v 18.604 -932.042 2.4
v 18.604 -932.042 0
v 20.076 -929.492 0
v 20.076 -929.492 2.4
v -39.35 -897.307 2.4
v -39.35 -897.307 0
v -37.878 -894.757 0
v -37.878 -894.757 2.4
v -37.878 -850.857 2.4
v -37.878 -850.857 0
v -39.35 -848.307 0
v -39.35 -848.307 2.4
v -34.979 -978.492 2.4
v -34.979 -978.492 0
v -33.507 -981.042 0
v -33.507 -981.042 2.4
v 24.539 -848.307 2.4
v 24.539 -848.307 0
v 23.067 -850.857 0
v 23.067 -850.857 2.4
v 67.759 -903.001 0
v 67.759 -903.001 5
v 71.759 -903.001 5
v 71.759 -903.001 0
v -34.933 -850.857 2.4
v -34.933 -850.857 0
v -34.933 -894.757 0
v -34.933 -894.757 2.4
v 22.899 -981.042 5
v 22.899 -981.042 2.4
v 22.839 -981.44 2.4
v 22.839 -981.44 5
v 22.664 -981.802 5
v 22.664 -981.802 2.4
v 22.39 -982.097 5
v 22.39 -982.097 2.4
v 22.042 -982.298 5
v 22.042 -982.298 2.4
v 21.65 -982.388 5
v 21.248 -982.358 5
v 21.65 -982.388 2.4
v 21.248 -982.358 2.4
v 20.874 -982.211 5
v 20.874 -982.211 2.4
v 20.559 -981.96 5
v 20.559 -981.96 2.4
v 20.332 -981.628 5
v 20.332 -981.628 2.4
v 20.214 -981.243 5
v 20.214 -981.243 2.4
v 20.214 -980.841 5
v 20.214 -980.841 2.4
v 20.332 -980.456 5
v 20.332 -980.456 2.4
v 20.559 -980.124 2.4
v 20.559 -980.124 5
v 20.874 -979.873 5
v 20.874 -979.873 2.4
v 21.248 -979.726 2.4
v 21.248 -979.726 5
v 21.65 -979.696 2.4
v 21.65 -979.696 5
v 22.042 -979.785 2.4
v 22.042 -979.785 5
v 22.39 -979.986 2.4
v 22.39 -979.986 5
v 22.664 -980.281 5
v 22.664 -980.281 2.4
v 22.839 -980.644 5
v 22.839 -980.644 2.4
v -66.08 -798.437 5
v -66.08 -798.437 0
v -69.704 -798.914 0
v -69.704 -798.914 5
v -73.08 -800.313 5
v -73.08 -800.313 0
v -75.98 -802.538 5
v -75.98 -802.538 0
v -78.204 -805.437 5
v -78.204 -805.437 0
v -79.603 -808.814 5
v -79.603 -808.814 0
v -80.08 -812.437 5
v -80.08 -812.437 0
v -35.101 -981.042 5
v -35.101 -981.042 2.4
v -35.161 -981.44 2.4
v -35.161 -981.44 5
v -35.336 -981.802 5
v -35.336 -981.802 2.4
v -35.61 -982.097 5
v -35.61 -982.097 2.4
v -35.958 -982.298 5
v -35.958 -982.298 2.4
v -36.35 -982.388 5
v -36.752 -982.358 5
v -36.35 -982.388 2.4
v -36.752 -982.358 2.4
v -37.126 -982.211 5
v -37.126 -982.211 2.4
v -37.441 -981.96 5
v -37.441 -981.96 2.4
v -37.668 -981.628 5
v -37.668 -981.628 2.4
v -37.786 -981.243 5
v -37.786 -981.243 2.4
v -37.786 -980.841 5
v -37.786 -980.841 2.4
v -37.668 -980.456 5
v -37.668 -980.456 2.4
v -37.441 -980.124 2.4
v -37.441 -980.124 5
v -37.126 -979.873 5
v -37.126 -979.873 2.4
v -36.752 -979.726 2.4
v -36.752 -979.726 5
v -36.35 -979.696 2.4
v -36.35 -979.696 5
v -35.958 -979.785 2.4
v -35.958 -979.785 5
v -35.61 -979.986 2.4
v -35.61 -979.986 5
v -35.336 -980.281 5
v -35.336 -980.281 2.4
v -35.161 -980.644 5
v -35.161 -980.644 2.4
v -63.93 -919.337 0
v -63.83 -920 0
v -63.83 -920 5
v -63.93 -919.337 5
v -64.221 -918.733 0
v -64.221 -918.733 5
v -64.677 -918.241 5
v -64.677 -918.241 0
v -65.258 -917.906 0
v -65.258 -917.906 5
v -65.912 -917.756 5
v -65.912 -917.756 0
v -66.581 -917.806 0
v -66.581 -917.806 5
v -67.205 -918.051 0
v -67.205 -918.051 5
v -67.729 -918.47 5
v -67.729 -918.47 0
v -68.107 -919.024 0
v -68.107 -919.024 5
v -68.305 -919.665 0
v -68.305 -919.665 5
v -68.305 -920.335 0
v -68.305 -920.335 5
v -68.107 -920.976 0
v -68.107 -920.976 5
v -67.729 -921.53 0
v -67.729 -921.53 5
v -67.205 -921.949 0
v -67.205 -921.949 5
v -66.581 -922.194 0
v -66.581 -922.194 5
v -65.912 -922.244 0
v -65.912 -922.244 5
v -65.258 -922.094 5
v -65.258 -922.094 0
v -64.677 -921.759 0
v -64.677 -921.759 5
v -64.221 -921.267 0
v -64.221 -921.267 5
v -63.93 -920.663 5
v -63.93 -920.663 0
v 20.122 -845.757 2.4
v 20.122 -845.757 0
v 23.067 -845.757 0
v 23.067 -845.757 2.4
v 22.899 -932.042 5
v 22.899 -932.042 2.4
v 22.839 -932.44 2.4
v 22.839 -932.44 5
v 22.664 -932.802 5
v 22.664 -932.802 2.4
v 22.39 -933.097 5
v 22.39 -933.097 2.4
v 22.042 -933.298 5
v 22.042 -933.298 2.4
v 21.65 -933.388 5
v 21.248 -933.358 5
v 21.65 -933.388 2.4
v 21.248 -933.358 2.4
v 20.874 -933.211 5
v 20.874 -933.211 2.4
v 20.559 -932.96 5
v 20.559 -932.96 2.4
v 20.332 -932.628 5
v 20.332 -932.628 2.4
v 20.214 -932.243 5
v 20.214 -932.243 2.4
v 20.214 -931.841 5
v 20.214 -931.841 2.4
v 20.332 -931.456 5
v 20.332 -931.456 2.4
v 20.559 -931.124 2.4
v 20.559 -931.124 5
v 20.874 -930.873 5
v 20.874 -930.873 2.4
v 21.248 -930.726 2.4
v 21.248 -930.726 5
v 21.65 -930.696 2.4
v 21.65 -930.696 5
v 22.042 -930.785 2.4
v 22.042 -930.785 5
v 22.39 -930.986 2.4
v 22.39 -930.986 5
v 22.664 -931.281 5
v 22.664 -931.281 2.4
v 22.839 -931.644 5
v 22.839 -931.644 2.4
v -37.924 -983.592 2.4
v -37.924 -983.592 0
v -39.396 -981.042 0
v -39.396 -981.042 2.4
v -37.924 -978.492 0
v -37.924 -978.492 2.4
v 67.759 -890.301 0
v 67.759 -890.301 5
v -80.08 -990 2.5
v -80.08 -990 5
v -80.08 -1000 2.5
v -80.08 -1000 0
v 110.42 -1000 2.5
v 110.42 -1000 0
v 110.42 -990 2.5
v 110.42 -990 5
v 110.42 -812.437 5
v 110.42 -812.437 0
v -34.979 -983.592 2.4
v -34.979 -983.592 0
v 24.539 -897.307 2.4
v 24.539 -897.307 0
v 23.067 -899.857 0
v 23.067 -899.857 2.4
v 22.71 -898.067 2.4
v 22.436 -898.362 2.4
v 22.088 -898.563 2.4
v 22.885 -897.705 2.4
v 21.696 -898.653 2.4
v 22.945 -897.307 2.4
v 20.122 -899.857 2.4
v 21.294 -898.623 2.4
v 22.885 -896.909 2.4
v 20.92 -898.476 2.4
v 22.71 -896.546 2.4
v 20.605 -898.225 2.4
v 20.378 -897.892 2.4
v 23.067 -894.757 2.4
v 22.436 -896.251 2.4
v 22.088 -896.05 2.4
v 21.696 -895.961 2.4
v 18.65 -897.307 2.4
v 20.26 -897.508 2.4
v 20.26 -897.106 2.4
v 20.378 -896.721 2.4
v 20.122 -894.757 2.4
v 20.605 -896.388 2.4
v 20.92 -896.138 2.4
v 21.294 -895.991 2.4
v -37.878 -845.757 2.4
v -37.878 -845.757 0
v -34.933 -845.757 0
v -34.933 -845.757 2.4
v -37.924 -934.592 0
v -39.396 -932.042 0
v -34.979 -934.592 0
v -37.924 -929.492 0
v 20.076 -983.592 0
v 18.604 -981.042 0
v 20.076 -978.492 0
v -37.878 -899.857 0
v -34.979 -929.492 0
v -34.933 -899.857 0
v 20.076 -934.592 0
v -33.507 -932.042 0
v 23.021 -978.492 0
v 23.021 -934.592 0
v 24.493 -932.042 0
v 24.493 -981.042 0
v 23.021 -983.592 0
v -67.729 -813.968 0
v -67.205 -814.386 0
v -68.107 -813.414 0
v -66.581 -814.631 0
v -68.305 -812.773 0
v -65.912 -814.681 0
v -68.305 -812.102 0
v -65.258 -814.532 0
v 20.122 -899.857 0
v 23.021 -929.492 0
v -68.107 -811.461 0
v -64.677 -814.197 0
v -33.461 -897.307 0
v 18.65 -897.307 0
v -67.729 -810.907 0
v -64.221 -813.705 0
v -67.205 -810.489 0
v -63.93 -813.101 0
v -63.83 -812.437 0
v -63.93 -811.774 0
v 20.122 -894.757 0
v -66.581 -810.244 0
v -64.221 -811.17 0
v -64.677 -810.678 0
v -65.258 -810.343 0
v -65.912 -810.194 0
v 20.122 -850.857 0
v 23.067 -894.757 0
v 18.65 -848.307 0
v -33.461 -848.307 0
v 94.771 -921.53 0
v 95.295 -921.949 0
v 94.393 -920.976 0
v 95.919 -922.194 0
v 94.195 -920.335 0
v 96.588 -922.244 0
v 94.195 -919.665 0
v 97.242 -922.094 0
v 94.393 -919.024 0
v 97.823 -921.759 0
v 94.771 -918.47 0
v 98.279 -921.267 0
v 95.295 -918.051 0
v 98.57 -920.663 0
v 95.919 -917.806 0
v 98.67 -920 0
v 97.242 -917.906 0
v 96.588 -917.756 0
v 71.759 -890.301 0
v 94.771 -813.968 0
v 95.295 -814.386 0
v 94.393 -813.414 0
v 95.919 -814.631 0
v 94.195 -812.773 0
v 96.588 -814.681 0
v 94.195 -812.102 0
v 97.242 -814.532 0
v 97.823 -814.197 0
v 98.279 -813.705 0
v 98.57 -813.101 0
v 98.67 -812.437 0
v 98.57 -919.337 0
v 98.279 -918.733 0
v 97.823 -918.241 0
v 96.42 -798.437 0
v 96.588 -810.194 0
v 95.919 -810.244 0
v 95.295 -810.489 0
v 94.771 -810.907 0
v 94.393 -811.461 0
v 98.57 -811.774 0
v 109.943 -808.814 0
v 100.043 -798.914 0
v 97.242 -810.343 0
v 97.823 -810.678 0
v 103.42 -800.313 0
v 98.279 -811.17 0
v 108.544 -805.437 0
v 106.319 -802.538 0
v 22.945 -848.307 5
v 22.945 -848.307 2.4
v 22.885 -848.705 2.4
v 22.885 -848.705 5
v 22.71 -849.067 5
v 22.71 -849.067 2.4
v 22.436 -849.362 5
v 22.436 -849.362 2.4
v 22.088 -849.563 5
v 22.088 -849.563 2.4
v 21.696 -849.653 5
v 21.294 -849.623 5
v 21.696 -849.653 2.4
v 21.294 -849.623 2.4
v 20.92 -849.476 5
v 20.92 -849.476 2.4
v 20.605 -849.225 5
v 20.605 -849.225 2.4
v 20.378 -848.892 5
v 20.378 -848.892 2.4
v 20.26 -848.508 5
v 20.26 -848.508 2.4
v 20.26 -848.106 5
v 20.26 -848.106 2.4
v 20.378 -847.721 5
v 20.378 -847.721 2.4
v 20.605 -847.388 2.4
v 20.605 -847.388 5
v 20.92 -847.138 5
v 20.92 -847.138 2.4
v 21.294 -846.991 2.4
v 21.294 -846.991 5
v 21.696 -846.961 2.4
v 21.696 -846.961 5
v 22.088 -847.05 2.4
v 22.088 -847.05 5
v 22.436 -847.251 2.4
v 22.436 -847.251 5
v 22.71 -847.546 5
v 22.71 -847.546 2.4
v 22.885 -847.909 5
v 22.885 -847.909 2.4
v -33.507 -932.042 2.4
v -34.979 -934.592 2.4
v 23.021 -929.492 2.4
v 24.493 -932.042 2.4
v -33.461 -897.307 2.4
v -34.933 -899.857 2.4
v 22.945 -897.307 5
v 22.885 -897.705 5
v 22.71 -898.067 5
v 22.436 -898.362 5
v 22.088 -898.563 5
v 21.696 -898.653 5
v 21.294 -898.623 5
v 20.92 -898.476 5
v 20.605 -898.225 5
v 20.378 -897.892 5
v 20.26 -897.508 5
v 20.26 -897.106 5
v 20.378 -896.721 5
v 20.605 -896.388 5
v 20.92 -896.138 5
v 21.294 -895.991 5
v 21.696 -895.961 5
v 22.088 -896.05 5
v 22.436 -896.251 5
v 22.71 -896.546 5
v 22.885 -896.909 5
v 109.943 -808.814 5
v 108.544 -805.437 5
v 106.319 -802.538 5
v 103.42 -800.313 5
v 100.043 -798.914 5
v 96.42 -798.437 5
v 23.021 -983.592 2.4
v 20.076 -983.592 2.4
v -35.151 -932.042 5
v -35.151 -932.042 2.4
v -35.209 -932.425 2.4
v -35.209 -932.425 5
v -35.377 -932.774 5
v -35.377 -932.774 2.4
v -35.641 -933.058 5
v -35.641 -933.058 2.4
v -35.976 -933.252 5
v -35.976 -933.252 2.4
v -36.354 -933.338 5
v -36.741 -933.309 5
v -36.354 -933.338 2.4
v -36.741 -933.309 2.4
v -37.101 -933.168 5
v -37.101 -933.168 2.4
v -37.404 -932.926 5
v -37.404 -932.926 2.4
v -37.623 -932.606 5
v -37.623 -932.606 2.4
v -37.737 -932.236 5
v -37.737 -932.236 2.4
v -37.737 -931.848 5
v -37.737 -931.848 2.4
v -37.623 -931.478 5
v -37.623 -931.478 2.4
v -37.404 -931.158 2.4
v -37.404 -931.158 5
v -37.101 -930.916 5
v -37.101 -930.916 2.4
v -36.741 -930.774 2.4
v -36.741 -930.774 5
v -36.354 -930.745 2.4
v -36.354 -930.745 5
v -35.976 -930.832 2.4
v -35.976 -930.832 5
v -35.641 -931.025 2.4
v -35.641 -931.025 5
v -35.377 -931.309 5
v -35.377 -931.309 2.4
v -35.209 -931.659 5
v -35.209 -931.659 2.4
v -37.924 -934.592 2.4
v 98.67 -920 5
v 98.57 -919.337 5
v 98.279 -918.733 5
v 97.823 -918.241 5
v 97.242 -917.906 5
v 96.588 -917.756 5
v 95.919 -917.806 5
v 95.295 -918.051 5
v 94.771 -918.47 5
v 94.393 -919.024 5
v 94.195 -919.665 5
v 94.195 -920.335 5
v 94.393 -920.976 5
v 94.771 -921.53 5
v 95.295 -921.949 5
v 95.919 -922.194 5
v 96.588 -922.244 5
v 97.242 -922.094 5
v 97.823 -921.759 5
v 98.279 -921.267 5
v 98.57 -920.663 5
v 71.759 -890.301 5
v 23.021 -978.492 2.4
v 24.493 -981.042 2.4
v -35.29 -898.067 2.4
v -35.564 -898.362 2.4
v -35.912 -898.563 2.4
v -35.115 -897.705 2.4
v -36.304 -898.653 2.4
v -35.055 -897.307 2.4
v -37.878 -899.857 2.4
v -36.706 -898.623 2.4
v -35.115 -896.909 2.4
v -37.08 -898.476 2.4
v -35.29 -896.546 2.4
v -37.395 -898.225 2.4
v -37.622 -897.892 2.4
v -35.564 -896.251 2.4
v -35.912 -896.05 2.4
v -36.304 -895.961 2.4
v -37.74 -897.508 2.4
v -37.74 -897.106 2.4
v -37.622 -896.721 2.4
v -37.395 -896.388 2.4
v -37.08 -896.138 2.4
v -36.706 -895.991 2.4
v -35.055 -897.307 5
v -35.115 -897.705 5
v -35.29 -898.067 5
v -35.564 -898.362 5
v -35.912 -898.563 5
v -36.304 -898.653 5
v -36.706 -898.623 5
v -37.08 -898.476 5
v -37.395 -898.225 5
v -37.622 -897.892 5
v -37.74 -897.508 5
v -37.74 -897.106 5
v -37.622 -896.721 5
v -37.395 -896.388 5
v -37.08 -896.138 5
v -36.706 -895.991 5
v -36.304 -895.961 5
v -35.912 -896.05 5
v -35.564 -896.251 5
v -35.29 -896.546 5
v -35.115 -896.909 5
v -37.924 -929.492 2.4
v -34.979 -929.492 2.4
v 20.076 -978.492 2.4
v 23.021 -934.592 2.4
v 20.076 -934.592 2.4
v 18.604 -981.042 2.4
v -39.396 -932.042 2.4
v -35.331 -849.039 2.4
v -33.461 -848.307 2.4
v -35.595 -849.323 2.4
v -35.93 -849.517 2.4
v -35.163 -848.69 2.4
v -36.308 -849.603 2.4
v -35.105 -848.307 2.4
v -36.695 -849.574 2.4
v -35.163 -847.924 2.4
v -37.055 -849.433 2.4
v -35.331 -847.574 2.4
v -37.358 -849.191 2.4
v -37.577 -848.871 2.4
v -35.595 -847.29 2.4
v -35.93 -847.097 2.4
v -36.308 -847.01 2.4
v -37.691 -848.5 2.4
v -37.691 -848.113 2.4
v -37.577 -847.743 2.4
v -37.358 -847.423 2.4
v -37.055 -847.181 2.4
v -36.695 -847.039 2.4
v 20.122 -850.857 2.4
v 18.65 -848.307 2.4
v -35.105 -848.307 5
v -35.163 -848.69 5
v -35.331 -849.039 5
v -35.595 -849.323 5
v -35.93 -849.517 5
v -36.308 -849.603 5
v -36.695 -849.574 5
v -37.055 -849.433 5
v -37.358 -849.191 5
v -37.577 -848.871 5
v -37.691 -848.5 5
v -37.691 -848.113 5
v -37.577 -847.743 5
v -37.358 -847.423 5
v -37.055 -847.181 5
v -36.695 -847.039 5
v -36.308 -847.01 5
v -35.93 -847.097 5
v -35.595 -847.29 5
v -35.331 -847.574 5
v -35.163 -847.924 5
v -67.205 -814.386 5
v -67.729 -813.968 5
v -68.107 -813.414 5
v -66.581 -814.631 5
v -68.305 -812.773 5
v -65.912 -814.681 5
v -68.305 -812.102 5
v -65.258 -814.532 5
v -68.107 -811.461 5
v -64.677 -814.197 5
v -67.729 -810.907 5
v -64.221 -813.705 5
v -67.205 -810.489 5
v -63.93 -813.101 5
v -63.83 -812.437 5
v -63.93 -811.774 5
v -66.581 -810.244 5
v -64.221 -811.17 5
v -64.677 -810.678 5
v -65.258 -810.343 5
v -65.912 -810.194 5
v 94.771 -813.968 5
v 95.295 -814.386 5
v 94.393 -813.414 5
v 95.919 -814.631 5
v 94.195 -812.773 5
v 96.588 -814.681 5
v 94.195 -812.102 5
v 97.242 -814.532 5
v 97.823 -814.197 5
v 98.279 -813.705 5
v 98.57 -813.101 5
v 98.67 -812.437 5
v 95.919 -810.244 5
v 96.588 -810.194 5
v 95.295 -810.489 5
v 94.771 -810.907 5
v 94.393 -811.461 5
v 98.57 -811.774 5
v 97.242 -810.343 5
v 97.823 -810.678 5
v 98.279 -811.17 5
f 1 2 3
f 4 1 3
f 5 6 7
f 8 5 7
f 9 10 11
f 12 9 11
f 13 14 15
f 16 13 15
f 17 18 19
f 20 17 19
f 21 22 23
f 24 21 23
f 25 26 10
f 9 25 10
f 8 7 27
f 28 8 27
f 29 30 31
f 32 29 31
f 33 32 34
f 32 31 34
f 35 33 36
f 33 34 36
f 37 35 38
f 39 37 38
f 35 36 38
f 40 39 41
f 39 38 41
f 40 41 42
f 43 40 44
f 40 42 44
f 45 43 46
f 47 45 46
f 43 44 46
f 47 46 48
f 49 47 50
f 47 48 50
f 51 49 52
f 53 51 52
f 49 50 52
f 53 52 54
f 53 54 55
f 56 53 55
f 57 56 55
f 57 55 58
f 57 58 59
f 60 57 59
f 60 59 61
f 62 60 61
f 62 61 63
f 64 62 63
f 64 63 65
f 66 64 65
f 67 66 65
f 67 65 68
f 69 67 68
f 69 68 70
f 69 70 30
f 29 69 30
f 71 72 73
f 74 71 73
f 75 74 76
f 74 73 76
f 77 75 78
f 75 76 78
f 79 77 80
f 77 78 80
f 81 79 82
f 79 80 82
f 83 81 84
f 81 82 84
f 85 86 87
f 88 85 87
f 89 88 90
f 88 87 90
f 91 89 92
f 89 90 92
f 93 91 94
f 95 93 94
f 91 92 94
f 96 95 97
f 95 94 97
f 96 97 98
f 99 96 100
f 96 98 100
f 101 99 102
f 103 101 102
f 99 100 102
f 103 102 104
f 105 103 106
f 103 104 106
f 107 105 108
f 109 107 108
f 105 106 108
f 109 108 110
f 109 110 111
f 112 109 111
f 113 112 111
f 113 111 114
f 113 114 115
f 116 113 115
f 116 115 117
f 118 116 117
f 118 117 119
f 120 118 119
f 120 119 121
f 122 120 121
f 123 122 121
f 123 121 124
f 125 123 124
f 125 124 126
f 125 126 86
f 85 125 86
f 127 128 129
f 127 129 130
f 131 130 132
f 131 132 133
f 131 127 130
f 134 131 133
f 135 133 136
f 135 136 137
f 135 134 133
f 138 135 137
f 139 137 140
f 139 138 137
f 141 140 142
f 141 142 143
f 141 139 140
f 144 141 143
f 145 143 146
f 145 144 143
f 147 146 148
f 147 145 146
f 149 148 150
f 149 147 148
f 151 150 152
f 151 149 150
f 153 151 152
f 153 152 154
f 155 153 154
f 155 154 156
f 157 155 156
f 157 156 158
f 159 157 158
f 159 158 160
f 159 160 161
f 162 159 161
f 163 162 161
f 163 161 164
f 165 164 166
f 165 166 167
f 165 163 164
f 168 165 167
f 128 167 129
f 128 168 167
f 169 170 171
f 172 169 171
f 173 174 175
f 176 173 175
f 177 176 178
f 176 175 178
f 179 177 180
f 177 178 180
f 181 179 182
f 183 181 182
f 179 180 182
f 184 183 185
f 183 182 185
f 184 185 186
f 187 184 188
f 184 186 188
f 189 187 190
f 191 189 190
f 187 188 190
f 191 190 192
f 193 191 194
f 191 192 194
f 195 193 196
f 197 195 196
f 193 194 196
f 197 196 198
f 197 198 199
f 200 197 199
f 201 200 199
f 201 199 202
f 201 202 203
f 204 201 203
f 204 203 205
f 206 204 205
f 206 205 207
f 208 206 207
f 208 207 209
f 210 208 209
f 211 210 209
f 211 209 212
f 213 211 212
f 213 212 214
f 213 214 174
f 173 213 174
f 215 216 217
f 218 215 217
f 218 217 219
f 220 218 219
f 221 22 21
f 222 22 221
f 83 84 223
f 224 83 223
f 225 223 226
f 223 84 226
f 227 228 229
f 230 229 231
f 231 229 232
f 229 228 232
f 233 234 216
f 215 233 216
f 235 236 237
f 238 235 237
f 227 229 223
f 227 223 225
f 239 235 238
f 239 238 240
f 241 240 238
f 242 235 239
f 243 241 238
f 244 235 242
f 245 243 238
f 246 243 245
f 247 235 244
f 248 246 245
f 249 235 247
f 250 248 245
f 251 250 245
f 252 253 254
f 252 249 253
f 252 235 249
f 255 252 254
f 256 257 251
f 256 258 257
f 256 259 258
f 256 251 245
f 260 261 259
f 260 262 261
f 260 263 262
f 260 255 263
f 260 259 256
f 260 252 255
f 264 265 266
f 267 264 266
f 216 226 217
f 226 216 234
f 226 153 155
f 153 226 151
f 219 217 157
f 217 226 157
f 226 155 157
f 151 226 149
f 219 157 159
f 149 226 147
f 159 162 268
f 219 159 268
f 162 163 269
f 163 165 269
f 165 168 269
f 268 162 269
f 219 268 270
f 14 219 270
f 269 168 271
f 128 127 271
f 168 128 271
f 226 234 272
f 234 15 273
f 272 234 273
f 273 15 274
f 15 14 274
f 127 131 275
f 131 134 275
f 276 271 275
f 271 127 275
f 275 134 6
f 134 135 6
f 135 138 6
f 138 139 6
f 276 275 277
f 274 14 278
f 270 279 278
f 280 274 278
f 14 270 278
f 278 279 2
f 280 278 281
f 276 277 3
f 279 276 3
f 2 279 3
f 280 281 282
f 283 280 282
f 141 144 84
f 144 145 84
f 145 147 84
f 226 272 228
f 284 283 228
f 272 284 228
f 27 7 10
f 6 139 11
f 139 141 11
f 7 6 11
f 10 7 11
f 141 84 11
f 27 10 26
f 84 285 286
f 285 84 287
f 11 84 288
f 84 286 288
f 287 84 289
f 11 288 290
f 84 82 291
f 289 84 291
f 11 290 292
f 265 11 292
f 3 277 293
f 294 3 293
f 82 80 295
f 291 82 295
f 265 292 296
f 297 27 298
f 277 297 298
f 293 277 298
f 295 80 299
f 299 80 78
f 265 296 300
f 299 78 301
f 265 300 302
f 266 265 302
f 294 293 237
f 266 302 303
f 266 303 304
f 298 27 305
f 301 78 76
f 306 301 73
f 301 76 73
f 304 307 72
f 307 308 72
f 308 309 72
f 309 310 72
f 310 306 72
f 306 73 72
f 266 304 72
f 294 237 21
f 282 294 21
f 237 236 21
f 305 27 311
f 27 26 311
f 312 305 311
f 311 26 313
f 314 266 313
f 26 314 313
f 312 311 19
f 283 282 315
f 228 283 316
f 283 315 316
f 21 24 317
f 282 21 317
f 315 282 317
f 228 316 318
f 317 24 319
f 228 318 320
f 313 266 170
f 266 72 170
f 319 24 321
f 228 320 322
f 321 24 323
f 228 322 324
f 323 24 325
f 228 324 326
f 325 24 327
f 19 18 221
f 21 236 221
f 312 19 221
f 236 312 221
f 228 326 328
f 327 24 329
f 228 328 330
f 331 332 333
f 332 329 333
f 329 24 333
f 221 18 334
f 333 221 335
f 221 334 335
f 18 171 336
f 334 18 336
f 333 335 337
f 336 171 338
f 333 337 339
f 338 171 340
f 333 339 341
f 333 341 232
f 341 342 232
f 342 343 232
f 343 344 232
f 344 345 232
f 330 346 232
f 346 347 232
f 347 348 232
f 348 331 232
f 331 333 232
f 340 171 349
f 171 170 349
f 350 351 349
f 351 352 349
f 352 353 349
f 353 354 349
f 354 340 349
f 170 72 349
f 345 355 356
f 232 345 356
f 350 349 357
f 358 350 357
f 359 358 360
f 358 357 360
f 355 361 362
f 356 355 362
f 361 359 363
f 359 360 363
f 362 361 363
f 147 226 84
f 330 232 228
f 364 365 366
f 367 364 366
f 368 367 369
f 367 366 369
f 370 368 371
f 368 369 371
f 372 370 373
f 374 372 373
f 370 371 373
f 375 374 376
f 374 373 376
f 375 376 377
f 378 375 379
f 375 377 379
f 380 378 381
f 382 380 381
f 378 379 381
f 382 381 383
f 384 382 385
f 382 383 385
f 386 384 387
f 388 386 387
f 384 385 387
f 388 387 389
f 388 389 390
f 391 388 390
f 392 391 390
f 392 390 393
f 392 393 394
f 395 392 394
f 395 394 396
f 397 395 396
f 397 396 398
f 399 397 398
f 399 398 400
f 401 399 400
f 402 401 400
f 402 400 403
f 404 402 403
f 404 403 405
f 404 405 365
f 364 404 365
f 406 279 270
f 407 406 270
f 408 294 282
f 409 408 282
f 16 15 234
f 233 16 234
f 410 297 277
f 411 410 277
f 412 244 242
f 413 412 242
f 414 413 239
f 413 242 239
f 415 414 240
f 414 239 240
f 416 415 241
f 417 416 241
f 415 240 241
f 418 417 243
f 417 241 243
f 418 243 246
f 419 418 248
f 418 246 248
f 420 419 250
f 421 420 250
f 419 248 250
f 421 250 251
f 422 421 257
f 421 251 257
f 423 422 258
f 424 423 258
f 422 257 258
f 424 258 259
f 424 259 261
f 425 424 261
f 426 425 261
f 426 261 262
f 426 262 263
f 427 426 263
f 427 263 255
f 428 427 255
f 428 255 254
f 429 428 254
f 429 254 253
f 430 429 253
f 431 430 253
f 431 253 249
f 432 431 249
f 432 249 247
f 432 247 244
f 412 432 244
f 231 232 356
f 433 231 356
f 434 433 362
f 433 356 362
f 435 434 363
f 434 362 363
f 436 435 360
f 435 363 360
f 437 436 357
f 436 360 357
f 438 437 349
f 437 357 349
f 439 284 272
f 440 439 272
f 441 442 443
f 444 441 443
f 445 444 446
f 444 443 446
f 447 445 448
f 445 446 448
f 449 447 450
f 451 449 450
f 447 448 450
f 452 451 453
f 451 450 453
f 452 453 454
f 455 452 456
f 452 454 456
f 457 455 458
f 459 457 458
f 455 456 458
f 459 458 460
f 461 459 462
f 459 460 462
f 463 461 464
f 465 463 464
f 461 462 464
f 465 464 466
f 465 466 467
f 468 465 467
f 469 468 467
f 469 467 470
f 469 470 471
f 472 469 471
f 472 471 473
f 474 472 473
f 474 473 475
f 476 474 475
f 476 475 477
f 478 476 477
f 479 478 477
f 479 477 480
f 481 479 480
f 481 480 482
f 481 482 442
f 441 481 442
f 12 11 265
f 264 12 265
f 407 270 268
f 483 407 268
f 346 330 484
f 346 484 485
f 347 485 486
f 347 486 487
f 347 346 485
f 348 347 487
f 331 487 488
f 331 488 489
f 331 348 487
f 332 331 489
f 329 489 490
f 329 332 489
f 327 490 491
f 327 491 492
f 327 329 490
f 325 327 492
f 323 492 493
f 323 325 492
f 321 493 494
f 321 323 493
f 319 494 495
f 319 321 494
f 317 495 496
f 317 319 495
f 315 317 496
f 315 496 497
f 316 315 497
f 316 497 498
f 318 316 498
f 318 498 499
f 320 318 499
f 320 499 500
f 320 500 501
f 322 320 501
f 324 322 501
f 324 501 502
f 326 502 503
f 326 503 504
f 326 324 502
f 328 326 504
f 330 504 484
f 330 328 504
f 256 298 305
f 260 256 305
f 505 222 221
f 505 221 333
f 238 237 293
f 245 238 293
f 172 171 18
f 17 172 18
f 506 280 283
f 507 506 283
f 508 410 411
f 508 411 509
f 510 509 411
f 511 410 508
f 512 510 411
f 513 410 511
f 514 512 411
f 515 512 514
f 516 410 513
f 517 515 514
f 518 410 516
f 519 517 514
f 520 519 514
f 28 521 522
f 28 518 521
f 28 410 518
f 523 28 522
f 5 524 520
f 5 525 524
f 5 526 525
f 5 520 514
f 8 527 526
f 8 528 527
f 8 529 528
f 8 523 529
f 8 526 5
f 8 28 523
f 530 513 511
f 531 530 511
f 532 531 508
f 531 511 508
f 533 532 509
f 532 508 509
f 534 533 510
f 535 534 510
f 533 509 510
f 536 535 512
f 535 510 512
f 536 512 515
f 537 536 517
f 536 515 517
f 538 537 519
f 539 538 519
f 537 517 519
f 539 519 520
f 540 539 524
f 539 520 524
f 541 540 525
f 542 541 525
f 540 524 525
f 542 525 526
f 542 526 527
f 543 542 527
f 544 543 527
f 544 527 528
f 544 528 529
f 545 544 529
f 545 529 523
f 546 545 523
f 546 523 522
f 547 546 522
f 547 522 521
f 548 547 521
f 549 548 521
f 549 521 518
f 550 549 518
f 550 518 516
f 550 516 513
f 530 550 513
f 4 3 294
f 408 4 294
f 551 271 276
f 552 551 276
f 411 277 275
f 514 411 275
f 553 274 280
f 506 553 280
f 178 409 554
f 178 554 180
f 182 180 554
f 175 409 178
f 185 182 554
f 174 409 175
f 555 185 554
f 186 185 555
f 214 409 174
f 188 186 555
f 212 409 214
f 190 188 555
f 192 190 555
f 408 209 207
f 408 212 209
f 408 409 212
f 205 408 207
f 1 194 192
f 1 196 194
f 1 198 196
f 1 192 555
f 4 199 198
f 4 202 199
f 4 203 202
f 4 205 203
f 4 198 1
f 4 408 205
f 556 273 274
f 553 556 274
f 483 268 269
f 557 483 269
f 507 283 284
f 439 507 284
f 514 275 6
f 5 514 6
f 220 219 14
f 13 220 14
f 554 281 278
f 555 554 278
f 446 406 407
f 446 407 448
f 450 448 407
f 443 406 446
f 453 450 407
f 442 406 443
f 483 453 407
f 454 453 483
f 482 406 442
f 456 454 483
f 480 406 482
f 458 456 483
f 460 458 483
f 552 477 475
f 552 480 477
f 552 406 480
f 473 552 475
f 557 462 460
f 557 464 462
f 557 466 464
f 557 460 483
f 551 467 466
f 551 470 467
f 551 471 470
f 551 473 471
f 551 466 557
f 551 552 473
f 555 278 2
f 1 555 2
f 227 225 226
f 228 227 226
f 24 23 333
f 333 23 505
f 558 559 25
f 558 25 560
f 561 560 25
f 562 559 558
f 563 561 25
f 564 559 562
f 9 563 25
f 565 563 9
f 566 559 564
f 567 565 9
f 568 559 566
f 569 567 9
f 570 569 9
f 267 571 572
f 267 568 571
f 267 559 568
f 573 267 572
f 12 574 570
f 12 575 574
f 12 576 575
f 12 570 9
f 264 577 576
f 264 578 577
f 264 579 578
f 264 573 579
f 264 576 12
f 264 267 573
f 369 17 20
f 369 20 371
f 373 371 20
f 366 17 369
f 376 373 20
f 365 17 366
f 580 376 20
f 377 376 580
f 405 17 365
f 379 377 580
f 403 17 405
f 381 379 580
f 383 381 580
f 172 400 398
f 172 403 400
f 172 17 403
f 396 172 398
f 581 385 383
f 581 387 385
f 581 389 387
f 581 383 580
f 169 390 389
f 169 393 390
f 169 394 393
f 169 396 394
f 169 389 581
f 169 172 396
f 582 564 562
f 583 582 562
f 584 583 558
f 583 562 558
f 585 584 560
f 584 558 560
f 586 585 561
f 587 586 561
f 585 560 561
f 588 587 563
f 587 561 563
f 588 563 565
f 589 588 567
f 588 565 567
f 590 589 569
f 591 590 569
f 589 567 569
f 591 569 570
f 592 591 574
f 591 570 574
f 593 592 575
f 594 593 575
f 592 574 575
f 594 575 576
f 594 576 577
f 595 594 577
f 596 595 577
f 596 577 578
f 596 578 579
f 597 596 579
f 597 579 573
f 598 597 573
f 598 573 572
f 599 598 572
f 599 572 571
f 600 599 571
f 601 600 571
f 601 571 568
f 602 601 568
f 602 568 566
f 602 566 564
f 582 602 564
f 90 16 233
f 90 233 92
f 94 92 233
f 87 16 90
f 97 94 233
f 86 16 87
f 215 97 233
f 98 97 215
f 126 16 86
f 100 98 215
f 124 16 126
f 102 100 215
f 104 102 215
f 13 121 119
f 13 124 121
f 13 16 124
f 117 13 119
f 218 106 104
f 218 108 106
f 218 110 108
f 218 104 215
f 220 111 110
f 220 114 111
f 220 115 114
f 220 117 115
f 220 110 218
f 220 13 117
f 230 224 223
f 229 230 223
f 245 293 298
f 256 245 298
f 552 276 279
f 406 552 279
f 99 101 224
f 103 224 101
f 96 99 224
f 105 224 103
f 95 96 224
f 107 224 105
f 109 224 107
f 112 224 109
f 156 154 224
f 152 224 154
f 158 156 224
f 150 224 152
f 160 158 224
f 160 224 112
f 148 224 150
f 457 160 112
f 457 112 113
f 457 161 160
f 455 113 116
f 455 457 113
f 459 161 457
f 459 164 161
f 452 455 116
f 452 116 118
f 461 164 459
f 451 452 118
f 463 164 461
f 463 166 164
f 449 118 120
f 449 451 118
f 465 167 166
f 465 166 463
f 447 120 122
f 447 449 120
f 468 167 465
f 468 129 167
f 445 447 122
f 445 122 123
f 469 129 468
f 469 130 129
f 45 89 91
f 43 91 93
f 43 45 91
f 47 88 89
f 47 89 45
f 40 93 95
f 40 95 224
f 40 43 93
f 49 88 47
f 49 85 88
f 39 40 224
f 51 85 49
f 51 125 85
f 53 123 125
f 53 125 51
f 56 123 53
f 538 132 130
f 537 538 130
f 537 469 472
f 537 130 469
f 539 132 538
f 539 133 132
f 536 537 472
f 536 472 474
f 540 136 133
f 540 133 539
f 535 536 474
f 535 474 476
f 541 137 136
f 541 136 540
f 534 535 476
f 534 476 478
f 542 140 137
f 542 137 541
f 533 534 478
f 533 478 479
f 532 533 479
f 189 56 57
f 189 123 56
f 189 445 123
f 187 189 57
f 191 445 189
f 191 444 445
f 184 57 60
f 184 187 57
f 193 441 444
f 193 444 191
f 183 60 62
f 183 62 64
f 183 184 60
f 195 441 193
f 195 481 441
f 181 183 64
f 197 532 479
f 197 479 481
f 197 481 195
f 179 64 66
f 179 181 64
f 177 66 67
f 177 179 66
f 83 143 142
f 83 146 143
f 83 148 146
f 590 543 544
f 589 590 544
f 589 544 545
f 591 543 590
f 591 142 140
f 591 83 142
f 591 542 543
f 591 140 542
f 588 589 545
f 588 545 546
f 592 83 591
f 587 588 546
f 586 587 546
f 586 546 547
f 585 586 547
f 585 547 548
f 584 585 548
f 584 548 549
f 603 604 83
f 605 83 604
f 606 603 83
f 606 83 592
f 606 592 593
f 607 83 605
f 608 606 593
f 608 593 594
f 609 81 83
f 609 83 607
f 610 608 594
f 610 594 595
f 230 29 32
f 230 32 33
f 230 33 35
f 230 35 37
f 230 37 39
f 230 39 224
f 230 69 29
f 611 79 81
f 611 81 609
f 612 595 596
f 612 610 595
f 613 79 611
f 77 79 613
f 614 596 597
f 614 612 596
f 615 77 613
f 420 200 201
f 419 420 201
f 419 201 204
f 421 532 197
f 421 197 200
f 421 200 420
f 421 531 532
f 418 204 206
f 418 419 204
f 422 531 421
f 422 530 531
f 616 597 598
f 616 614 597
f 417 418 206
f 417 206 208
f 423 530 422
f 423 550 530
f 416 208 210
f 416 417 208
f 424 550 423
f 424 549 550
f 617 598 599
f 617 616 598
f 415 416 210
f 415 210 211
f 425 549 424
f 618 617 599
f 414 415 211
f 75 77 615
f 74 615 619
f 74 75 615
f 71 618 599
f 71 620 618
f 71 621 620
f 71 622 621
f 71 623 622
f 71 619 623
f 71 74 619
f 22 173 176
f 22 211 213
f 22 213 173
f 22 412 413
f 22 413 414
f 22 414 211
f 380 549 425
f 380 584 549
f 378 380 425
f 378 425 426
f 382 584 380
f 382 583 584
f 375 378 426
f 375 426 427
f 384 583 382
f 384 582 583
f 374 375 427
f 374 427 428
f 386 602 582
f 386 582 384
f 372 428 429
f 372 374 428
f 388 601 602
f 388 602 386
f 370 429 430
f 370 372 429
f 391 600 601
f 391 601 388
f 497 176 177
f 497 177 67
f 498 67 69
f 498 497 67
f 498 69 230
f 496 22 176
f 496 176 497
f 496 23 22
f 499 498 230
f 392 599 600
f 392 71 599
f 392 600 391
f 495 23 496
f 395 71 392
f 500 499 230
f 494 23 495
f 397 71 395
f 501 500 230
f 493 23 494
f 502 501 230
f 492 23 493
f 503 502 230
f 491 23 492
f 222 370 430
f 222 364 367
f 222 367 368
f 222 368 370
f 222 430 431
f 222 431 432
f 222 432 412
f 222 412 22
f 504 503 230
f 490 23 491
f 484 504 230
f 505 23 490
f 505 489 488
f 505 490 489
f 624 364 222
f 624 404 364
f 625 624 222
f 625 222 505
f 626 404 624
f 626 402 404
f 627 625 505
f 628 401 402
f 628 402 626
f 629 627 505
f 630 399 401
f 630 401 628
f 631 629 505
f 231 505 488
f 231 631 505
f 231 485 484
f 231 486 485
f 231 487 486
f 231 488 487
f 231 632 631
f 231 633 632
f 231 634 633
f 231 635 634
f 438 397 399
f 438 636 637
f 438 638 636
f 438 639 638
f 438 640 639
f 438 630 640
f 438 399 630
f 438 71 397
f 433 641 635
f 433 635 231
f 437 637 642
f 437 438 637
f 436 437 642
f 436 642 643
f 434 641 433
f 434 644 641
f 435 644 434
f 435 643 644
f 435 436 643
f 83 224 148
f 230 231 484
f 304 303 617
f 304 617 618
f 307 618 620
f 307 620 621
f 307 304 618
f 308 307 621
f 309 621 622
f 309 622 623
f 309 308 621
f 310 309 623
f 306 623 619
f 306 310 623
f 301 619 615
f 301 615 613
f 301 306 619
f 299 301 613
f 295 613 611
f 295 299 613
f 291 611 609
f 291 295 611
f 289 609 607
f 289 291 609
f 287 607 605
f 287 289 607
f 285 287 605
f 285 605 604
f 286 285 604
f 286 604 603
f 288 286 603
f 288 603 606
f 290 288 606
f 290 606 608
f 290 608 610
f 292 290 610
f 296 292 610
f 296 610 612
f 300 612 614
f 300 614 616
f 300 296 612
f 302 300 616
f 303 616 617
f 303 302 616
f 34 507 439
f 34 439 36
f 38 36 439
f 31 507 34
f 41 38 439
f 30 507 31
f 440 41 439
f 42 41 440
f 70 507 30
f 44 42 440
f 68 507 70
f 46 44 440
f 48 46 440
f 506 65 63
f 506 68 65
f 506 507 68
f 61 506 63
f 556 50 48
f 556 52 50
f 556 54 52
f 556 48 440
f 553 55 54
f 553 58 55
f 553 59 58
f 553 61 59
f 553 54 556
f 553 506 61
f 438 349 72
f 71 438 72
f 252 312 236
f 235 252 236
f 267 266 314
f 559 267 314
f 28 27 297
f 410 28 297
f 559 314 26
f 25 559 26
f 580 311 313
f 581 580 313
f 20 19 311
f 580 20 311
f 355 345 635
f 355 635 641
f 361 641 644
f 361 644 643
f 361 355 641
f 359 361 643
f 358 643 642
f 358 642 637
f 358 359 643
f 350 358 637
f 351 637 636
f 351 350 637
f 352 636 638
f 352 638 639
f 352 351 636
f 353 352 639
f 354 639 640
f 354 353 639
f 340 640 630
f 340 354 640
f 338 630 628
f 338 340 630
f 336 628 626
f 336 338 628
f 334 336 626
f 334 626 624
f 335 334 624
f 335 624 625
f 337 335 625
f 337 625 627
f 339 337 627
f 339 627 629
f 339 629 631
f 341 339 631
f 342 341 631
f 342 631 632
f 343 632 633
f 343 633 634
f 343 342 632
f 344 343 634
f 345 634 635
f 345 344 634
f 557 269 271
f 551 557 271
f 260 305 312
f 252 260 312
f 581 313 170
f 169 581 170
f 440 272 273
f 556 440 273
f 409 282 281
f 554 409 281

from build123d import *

# Parameters (mm, degrees)
SKETCH4_R           = 2.25
SKETCH4_R_2         = 7.9375
BOSS_EXTRUDE1_DEPTH = 5
CUT_EXTRUDE1_DEPTH  = 191.5
SKETCH8_R           = 1.35
SKETCH8_R_2         = 1.3
CUT_EXTRUDE2_DEPTH  = 6
SKETCH9_R           = 1.35
SKETCH9_R_2         = 1.3
CUT_EXTRUDE3_DEPTH  = 6
CUT_EXTRUDE4_DEPTH  = 2.4
SKETCH12_W          = 4
SKETCH12_H          = 12.7
CUT_EXTRUDE5_DEPTH  = 6


with BuildPart() as part:
    # Sketch4 → Boss-Extrude1 (new body)
    with BuildSketch(Plane.XY):
        with BuildLine():
            Line((-66.080112923, -1201.56262), (96.419887077, -1201.56262))
            ThreePointArc((96.419887077, -1201.56262), (106.319382013, -1197.462114937), (110.419887077, -1187.56262))
            Line((110.419887077, -1187.56262), (110.419887077, -812.43738))
            ThreePointArc((110.419887077, -812.43738), (106.319382013, -802.537885063), (96.419887077, -798.43738))
            Line((96.419887077, -798.43738), (-66.080112923, -798.43738))
            ThreePointArc((-66.080112923, -798.43738), (-75.97960786, -802.537885063), (-80.080112923, -812.43738))
            Line((-80.080112923, -812.43738), (-80.080112923, -1187.56262))
            ThreePointArc((-80.080112923, -1187.56262), (-75.97960786, -1197.462114937), (-66.080112923, -1201.56262))
        make_face()
        with Locations((96.419887077, -1080)):
            Circle(SKETCH4_R, mode=Mode.SUBTRACT)
        with Locations((88.147808187, -1029.0799835)):
            Circle(SKETCH4_R_2, mode=Mode.SUBTRACT)
        with Locations((-66.080112923, -1080)):
            Circle(SKETCH4_R, mode=Mode.SUBTRACT)
        with Locations((96.419887077, -920)):
            Circle(SKETCH4_R, mode=Mode.SUBTRACT)
        with Locations((-66.080112923, -920)):
            Circle(SKETCH4_R, mode=Mode.SUBTRACT)
        with Locations((-66.080112923, -1187.56262)):
            Circle(SKETCH4_R, mode=Mode.SUBTRACT)
        with Locations((96.419887077, -1187.56262)):
            Circle(SKETCH4_R, mode=Mode.SUBTRACT)
        with Locations((-66.080112923, -812.43738)):
            Circle(SKETCH4_R, mode=Mode.SUBTRACT)
        with Locations((96.419887077, -812.43738)):
            Circle(SKETCH4_R, mode=Mode.SUBTRACT)
    extrude(amount=BOSS_EXTRUDE1_DEPTH)

    # Sketch5 → Cut-Extrude1 (cut, through all)
    with BuildSketch(Plane(origin=(110.419887077, 0, 0), x_dir=(0, 0, -1), z_dir=(1, 0, 0))):
        Polygon((-2.5, -990), (-2.5, -1000), (0, -1000), (105.330135386, -1133.485190723), (-31.100407904, -1241.139436993), (-117.784745415, -1052.296655995), (-5, -990), align=None)
    extrude(amount=-CUT_EXTRUDE1_DEPTH, mode=Mode.SUBTRACT)

    # Sketch8 → Cut-Extrude2 (cut, through all)
    with BuildSketch(Plane(origin=(0, 0, 0), x_dir=(1, 0, 0), z_dir=(0, 0, -1))):
        with Locations((-36.405274736, 897.30672742)):
            Circle(SKETCH8_R)
        with Locations((21.594725264, 897.30672742)):
            Circle(SKETCH8_R)
        with Locations((21.594725264, 848.30672742)):
            Circle(SKETCH8_R)
        with Locations((-36.405274736, 848.30672742)):
            Circle(SKETCH8_R_2)
    extrude(amount=-CUT_EXTRUDE2_DEPTH, mode=Mode.SUBTRACT)

    # Sketch9 → Cut-Extrude3 (cut, through all)
    with BuildSketch(Plane(origin=(0, 0, 0), x_dir=(1, 0, 0), z_dir=(0, 0, -1))):
        with Locations((-36.451263927, 981.041793441)):
            Circle(SKETCH9_R)
        with Locations((21.548736073, 981.041793441)):
            Circle(SKETCH9_R)
        with Locations((21.548736073, 932.041793441)):
            Circle(SKETCH9_R)
        with Locations((-36.451263927, 932.041793441)):
            Circle(SKETCH9_R_2)
    extrude(amount=-CUT_EXTRUDE3_DEPTH, mode=Mode.SUBTRACT)

    # Sketch11 → Cut-Extrude4 (cut)
    with BuildSketch(Plane(origin=(0, 0, 0), x_dir=(-1, 0, 0), z_dir=(0, 0, -1))):
        Polygon((-20.122482078, -845.75672742), (-23.066968451, -845.75672742), (-24.539211637, -848.30672742), (-23.066968451, -850.85672742), (-20.122482078, -850.85672742), (-18.650238891, -848.30672742), align=None)
        Polygon((34.933031549, -845.75672742), (33.460788363, -848.30672742), (34.933031549, -850.85672742), (37.877517922, -850.85672742), (39.349761109, -848.30672742), (37.877517922, -845.75672742), align=None)
        Polygon((34.933031549, -894.75672742), (33.460788363, -897.30672742), (34.933031549, -899.85672742), (37.877517922, -899.85672742), (39.349761109, -897.30672742), (37.877517922, -894.75672742), align=None)
        Polygon((-20.122482078, -894.75672742), (-23.066968451, -894.75672742), (-24.539211637, -897.30672742), (-23.066968451, -899.85672742), (-20.122482078, -899.85672742), (-18.650238891, -897.30672742), align=None)
        Polygon((-20.076492886, -929.491793441), (-23.020979259, -929.491793441), (-24.493222445, -932.041793441), (-23.020979259, -934.591793441), (-20.076492886, -934.591793441), (-18.6042497, -932.041793441), align=None)
        Polygon((34.979020741, -929.491793441), (33.506777555, -932.041793441), (34.979020741, -934.591793441), (37.923507114, -934.591793441), (39.3957503, -932.041793441), (37.923507114, -929.491793441), align=None)
        Polygon((-23.020979259, -978.491793441), (-24.493222445, -981.041793441), (-23.020979259, -983.591793441), (-20.076492886, -983.591793441), (-18.6042497, -981.041793441), (-20.076492886, -978.491793441), align=None)
        Polygon((34.979020741, -978.491793441), (33.506777555, -981.041793441), (34.979020741, -983.591793441), (37.923507114, -983.591793441), (39.3957503, -981.041793441), (37.923507114, -978.491793441), align=None)
    extrude(amount=-CUT_EXTRUDE4_DEPTH, mode=Mode.SUBTRACT)

    # Sketch12 → Cut-Extrude5 (cut, through all)
    with BuildSketch(Plane.XY.offset(5)):
        with Locations((69.759334594, -896.65140708)):
            Rectangle(SKETCH12_W, SKETCH12_H)
    extrude(amount=-CUT_EXTRUDE5_DEPTH, mode=Mode.SUBTRACT)


solid = part.part
